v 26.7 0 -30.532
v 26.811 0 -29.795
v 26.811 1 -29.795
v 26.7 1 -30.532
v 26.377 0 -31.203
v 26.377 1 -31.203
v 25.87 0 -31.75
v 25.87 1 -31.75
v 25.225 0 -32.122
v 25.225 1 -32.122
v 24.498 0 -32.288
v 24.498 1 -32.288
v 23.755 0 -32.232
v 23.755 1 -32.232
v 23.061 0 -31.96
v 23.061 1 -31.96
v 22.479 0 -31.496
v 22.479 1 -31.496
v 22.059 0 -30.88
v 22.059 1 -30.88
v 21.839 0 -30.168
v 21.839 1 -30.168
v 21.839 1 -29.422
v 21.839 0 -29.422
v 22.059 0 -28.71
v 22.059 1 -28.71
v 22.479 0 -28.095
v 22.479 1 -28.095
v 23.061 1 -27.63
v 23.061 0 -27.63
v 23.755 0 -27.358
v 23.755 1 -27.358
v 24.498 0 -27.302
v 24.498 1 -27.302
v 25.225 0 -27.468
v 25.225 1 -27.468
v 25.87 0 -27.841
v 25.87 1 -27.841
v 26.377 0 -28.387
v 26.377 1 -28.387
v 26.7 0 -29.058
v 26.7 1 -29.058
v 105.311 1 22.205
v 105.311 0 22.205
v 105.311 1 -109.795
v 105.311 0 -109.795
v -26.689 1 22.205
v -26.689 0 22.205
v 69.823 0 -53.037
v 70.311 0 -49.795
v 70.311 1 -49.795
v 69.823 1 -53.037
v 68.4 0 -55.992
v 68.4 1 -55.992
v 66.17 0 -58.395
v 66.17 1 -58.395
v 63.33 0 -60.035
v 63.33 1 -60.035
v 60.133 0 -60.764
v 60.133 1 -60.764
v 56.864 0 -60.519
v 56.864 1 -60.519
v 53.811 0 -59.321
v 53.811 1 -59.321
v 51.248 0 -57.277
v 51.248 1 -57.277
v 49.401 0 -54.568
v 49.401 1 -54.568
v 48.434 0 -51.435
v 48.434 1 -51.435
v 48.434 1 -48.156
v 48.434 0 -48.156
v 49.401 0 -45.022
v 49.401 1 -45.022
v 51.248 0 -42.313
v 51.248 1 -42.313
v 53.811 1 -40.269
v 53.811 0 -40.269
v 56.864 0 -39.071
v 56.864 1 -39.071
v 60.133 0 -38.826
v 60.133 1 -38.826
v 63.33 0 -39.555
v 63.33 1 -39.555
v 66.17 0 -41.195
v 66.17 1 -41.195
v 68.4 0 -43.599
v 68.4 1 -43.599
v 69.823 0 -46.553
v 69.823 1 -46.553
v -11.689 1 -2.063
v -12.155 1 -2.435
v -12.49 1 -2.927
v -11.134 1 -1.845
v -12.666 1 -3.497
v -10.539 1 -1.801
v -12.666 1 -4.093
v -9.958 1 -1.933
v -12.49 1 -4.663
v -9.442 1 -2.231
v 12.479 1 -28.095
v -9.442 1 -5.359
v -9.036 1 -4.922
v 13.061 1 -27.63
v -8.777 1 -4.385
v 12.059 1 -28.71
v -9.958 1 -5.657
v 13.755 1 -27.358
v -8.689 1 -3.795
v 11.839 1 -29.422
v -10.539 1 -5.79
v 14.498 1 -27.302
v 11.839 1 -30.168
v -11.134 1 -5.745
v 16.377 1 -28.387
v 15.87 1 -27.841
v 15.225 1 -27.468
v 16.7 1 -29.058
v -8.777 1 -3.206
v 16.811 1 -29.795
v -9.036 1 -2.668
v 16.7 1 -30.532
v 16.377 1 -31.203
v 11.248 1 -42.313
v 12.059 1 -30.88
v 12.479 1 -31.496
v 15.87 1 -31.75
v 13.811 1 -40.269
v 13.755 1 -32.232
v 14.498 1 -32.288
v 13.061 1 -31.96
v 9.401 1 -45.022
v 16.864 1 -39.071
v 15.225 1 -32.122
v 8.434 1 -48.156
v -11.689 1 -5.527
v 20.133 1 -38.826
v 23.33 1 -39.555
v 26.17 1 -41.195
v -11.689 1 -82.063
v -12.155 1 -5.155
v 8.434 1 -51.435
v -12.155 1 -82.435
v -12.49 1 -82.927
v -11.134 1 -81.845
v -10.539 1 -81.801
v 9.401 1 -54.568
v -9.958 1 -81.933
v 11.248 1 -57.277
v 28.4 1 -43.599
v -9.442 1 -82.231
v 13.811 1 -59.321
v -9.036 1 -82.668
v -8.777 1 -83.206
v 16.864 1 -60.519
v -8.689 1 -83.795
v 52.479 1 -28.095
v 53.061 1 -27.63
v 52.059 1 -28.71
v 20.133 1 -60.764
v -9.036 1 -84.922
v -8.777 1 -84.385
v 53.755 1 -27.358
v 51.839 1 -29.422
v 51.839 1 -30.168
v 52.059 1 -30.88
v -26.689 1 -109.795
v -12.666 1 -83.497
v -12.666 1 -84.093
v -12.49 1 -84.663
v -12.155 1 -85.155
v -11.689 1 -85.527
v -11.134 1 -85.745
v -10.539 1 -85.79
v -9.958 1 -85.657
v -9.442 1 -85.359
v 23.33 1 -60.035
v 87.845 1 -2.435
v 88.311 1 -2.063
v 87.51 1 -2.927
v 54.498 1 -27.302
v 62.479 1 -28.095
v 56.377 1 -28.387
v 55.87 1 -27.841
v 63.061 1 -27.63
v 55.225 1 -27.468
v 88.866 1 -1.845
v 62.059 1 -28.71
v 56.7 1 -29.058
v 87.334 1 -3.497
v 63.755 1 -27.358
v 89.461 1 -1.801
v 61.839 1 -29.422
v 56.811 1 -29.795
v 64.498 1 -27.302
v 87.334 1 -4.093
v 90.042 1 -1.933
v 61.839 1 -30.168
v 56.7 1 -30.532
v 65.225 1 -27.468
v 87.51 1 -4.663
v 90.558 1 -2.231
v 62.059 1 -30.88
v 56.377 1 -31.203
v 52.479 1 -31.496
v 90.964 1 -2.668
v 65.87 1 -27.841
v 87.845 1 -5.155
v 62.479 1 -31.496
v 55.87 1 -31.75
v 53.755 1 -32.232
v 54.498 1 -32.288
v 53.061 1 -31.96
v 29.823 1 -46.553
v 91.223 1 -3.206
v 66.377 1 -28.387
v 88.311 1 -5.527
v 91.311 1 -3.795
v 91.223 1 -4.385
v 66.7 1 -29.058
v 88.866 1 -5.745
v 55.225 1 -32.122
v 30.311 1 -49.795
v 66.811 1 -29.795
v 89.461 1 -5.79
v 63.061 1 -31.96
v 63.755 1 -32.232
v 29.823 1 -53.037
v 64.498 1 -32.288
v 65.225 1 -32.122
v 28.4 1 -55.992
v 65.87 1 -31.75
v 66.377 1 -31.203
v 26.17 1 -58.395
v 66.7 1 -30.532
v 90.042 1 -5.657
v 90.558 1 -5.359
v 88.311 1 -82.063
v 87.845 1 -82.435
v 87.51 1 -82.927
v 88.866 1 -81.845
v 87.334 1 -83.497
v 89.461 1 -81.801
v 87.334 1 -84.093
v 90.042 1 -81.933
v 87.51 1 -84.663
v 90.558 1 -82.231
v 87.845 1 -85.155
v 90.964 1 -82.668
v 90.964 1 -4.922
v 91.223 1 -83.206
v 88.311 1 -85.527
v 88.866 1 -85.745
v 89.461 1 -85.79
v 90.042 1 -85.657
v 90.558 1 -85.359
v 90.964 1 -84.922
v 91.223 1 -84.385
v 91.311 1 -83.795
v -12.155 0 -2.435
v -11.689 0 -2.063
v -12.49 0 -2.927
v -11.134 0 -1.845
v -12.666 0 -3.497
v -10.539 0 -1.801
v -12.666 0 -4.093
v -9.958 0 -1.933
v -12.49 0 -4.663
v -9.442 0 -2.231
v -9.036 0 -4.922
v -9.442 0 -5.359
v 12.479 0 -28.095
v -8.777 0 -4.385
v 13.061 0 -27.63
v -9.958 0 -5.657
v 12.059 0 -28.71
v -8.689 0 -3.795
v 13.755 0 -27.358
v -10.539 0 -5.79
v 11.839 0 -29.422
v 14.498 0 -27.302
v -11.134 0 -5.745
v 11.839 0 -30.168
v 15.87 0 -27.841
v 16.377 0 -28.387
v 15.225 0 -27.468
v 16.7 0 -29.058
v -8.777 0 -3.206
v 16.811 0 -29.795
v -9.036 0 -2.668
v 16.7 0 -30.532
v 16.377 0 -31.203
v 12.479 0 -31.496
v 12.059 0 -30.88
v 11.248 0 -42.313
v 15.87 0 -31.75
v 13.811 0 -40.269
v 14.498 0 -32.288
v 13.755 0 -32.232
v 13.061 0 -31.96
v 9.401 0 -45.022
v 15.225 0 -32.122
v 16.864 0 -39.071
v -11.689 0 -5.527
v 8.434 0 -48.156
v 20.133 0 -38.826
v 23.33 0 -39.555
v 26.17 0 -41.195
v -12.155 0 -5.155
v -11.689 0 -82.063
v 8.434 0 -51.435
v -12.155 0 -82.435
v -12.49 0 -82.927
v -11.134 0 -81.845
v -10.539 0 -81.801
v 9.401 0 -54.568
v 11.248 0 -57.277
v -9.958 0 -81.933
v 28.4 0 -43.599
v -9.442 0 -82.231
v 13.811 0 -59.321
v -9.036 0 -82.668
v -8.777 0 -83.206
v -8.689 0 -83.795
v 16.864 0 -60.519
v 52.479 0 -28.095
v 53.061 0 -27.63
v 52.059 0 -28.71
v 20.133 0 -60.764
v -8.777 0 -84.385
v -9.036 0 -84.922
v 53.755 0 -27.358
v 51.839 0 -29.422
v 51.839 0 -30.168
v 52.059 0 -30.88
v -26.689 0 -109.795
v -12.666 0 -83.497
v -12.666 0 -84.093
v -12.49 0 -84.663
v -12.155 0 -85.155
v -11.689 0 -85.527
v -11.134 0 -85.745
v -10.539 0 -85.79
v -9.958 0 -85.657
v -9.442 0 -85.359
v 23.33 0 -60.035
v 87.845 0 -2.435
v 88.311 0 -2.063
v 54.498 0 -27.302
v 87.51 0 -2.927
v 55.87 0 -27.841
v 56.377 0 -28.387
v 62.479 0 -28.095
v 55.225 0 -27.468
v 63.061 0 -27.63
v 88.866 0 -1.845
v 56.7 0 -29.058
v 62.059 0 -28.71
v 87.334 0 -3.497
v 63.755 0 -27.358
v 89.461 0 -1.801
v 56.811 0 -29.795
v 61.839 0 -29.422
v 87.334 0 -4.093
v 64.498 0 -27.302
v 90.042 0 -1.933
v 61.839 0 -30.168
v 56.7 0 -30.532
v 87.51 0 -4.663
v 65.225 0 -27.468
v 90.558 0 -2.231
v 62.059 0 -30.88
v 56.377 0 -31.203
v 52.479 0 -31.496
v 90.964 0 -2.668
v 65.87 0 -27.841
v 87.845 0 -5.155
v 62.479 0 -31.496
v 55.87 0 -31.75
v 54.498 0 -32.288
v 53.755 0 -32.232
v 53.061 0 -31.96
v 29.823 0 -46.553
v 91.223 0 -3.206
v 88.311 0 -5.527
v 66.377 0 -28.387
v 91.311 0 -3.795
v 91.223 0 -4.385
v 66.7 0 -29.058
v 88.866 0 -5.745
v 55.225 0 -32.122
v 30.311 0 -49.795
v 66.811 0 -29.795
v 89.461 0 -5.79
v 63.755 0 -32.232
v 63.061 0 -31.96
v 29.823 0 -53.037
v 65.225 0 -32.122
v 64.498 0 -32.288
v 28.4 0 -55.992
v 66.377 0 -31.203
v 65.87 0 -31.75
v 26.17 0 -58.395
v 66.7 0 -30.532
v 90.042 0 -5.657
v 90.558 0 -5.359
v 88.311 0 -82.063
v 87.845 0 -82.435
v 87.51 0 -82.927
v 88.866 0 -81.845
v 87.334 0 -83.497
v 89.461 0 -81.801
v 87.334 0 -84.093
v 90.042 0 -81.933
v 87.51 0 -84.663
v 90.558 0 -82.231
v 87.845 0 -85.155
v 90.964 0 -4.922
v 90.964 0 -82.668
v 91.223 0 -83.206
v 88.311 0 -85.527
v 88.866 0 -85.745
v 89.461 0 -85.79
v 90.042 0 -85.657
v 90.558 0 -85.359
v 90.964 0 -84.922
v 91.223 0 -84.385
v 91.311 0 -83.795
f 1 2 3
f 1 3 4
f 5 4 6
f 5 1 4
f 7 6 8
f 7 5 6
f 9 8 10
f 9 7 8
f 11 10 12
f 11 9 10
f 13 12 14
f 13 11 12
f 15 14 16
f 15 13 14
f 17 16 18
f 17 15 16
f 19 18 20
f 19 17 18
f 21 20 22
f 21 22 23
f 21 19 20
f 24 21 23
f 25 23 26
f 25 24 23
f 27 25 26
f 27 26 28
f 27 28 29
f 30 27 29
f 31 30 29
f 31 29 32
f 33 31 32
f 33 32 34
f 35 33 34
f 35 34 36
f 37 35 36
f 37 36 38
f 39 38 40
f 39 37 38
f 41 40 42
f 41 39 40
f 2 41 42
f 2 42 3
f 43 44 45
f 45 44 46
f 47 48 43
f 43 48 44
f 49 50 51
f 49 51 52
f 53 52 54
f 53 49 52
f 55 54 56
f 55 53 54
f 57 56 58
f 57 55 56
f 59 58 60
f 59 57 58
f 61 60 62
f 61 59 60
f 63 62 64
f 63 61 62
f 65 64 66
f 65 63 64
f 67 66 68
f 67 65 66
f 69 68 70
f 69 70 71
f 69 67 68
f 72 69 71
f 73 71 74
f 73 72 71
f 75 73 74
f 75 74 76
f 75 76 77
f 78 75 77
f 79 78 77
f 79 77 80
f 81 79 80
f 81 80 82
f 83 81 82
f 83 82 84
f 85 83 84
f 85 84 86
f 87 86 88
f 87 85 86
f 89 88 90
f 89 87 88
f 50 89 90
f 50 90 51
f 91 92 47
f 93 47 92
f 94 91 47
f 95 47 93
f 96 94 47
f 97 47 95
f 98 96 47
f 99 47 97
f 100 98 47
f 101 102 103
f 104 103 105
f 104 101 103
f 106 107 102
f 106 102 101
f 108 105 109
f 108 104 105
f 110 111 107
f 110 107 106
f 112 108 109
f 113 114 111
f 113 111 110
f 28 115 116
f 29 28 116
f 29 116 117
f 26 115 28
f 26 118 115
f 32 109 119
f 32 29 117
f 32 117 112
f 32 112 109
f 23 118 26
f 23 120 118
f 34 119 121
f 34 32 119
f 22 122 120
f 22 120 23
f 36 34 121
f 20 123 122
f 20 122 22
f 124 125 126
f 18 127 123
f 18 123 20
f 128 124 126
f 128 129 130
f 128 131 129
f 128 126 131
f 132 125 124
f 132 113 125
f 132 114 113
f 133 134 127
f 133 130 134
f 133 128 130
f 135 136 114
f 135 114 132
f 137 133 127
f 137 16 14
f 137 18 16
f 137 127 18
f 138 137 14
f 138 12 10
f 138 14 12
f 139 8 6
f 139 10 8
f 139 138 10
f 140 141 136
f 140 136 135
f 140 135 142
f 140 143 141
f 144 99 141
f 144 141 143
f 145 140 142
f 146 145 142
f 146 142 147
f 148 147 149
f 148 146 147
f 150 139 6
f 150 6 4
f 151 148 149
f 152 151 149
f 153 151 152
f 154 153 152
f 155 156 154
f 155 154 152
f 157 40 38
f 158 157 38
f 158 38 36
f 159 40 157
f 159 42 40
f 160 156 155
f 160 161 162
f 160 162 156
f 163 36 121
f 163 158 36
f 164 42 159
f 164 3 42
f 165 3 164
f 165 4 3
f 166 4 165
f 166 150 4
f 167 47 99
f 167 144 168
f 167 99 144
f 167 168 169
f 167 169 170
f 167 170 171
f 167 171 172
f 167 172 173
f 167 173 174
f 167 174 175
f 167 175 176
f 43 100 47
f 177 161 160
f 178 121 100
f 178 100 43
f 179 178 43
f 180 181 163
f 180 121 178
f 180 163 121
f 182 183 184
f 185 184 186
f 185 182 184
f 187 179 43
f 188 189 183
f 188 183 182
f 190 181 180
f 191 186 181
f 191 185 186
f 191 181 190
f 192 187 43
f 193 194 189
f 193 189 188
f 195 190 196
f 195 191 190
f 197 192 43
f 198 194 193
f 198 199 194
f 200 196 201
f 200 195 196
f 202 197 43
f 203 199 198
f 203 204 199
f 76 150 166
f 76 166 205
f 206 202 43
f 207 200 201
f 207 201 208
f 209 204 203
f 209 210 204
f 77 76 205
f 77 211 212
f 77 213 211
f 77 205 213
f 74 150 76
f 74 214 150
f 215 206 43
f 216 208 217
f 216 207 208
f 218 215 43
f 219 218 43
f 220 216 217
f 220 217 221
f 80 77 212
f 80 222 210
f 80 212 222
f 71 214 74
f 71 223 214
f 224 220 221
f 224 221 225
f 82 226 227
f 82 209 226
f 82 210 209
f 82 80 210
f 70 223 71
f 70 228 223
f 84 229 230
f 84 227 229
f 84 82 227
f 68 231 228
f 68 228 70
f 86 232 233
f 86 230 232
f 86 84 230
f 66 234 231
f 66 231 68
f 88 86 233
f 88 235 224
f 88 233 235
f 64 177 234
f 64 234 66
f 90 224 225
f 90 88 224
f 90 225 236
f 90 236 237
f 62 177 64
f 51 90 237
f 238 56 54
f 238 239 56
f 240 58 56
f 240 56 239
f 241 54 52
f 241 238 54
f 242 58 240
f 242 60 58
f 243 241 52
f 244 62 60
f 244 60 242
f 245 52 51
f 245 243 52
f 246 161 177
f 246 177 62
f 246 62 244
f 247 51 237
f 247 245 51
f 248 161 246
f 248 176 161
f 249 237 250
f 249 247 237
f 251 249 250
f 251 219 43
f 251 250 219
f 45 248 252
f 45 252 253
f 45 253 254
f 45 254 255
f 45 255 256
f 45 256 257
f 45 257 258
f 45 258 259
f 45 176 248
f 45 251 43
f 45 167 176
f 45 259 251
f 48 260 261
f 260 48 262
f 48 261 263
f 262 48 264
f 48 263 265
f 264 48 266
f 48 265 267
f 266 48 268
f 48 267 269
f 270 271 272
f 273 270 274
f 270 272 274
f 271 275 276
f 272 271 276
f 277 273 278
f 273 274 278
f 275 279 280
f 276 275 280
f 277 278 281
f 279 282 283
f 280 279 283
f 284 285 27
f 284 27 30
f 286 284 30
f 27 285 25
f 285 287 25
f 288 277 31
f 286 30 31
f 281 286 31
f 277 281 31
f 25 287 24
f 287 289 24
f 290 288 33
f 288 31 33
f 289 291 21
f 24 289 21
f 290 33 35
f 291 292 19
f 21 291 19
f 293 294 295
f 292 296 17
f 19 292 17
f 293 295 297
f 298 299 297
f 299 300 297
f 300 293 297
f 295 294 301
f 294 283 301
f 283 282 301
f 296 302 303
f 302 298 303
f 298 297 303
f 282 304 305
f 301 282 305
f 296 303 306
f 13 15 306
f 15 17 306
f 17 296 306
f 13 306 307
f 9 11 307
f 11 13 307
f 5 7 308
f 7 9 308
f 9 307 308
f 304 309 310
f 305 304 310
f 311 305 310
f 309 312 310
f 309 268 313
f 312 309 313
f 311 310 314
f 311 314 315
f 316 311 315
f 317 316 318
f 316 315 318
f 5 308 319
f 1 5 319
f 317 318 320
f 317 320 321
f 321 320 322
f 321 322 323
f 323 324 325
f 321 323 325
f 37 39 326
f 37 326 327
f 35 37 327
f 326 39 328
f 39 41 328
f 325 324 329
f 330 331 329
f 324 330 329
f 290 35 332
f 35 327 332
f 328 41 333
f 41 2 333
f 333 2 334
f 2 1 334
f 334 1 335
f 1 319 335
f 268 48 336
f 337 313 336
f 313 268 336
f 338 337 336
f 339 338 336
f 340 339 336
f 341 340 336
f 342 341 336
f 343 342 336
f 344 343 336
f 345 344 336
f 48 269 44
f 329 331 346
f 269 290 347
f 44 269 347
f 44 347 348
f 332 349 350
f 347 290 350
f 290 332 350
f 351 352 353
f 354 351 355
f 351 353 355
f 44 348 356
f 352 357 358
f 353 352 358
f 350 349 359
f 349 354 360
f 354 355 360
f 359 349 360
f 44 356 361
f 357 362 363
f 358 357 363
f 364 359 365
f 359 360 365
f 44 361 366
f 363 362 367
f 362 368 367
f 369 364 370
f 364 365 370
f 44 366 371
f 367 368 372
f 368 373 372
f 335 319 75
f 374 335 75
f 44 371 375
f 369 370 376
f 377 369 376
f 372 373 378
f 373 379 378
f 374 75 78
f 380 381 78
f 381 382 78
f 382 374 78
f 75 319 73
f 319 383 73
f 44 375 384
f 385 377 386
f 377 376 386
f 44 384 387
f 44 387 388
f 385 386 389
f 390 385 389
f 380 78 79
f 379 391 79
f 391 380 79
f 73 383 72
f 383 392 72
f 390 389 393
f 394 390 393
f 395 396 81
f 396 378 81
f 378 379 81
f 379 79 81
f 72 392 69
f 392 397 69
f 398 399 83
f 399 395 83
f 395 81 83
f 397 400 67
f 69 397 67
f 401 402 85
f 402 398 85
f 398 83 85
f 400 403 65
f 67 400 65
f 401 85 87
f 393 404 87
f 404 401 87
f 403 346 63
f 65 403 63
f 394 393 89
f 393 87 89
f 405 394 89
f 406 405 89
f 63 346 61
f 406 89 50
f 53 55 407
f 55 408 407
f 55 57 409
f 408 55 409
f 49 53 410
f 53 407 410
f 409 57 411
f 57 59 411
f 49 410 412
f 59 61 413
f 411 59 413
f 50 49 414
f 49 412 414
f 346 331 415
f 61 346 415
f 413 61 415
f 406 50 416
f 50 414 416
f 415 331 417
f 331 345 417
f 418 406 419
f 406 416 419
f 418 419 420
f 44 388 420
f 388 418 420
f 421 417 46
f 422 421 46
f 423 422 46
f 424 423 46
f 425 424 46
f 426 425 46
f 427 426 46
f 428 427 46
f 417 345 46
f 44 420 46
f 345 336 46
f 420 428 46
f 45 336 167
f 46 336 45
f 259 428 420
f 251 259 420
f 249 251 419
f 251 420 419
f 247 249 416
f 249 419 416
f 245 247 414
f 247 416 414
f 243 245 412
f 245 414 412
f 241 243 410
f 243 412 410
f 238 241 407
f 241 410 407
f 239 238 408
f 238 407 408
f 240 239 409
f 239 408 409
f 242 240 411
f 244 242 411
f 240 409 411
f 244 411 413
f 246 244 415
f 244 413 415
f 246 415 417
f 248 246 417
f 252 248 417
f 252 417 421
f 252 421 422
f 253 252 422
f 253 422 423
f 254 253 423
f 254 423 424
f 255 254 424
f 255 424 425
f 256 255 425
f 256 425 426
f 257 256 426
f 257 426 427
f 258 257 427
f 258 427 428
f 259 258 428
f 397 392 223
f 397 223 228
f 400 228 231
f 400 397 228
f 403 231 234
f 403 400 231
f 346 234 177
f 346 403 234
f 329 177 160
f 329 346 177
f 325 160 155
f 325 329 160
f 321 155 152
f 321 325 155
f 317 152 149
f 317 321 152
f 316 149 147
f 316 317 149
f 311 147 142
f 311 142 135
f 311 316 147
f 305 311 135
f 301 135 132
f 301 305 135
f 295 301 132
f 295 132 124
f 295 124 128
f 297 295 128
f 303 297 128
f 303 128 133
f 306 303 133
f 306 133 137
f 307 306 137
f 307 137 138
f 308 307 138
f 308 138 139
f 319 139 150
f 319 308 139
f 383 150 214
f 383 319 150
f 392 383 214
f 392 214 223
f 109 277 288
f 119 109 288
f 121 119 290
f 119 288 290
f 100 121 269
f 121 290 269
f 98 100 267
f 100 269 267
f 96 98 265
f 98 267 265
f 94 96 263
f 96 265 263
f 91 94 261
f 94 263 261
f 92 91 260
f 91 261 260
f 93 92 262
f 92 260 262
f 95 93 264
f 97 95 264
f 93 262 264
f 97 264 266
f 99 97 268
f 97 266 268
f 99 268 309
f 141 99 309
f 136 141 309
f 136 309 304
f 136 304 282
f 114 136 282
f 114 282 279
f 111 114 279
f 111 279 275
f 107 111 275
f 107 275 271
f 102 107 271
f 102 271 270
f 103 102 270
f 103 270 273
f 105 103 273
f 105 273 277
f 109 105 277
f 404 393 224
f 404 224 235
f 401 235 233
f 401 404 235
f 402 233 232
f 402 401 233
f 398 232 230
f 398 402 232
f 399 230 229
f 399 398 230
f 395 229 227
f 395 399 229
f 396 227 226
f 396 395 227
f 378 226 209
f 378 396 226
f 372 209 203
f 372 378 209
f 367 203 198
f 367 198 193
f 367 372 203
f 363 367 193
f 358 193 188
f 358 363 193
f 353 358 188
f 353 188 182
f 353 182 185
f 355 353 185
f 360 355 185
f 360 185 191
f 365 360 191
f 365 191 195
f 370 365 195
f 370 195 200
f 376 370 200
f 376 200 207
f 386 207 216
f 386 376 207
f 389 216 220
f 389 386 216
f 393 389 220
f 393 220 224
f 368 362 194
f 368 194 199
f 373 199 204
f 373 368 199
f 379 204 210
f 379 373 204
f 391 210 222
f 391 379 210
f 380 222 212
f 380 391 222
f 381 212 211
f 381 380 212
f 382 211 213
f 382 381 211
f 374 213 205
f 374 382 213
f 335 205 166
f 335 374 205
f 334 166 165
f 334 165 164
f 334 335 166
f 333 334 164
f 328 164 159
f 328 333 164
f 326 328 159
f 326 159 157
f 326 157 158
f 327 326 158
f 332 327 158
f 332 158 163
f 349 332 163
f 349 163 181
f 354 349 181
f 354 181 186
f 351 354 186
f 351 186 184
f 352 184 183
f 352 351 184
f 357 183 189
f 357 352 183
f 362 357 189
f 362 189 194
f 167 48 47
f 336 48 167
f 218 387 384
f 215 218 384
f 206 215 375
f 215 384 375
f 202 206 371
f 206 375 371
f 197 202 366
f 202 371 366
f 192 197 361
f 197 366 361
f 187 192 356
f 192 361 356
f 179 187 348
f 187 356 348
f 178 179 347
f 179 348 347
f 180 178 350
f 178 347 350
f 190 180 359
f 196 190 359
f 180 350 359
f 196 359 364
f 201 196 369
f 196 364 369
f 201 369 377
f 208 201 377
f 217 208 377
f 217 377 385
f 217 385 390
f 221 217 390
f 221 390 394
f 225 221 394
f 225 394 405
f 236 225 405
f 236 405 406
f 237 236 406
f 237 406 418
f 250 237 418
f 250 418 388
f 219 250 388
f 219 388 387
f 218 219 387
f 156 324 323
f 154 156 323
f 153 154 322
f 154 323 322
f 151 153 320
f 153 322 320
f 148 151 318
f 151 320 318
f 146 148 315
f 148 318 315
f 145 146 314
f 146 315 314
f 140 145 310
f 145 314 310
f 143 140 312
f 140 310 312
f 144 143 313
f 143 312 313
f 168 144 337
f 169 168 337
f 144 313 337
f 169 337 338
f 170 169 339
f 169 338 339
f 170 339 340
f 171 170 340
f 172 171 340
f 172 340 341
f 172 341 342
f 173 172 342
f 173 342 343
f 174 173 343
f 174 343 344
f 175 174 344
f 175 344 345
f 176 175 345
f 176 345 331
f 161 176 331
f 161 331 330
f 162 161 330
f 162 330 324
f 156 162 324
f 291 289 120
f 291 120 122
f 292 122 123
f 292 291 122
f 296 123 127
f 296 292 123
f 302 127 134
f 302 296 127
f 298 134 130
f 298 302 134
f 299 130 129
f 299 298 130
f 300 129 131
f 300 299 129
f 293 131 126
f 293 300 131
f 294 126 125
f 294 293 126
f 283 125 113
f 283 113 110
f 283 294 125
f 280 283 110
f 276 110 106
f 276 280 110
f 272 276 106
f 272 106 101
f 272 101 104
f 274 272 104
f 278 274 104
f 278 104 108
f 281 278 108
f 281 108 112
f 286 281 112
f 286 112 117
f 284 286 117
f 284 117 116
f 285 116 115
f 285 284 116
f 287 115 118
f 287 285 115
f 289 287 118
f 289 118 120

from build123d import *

# Parameters (mm, degrees)
SKETCH1_W           = 132
SKETCH1_H           = 132
SKETCH1_R           = 2.5
SKETCH1_R_2         = 11
BOSS_EXTRUDE1_DEPTH = 1
SKETCH2_R           = 2
CUT_EXTRUDE1_DEPTH  = 2


with BuildPart() as part:
    # Sketch1 → Boss-Extrude1 (new body)
    with BuildSketch(Plane(origin=(0, 0, 0), x_dir=(1, 0, 0), z_dir=(0, 1, 0))):
        with Locations((39.311456102, 43.795094937)):
            Rectangle(SKETCH1_W, SKETCH1_H)
        with Locations((14.311456102, 29.795094937)):
            Circle(SKETCH1_R, mode=Mode.SUBTRACT)
        with Locations((24.311456102, 29.795094937)):
            Circle(SKETCH1_R, mode=Mode.SUBTRACT)
        with Locations((54.311456102, 29.795094937)):
            Circle(SKETCH1_R, mode=Mode.SUBTRACT)
        with Locations((64.311456102, 29.795094937)):
            Circle(SKETCH1_R, mode=Mode.SUBTRACT)
        with Locations((19.311456102, 49.795094937)):
            Circle(SKETCH1_R_2, mode=Mode.SUBTRACT)
        with Locations((59.311456102, 49.795094937)):
            Circle(SKETCH1_R_2, mode=Mode.SUBTRACT)
    extrude(amount=BOSS_EXTRUDE1_DEPTH)

    # Sketch2 → Cut-Extrude1 (cut, through all)
    with BuildSketch(Plane.XZ):
        with Locations((-10.688543898, -3.795094937)):
            Circle(SKETCH2_R)
        with Locations((89.311456102, -3.795094937)):
            Circle(SKETCH2_R)
        with Locations((89.311456102, -83.795094937)):
            Circle(SKETCH2_R)
        with Locations((-10.688543898, -83.795094937)):
            Circle(SKETCH2_R)
    extrude(amount=-CUT_EXTRUDE1_DEPTH, mode=Mode.SUBTRACT)


solid = part.part
